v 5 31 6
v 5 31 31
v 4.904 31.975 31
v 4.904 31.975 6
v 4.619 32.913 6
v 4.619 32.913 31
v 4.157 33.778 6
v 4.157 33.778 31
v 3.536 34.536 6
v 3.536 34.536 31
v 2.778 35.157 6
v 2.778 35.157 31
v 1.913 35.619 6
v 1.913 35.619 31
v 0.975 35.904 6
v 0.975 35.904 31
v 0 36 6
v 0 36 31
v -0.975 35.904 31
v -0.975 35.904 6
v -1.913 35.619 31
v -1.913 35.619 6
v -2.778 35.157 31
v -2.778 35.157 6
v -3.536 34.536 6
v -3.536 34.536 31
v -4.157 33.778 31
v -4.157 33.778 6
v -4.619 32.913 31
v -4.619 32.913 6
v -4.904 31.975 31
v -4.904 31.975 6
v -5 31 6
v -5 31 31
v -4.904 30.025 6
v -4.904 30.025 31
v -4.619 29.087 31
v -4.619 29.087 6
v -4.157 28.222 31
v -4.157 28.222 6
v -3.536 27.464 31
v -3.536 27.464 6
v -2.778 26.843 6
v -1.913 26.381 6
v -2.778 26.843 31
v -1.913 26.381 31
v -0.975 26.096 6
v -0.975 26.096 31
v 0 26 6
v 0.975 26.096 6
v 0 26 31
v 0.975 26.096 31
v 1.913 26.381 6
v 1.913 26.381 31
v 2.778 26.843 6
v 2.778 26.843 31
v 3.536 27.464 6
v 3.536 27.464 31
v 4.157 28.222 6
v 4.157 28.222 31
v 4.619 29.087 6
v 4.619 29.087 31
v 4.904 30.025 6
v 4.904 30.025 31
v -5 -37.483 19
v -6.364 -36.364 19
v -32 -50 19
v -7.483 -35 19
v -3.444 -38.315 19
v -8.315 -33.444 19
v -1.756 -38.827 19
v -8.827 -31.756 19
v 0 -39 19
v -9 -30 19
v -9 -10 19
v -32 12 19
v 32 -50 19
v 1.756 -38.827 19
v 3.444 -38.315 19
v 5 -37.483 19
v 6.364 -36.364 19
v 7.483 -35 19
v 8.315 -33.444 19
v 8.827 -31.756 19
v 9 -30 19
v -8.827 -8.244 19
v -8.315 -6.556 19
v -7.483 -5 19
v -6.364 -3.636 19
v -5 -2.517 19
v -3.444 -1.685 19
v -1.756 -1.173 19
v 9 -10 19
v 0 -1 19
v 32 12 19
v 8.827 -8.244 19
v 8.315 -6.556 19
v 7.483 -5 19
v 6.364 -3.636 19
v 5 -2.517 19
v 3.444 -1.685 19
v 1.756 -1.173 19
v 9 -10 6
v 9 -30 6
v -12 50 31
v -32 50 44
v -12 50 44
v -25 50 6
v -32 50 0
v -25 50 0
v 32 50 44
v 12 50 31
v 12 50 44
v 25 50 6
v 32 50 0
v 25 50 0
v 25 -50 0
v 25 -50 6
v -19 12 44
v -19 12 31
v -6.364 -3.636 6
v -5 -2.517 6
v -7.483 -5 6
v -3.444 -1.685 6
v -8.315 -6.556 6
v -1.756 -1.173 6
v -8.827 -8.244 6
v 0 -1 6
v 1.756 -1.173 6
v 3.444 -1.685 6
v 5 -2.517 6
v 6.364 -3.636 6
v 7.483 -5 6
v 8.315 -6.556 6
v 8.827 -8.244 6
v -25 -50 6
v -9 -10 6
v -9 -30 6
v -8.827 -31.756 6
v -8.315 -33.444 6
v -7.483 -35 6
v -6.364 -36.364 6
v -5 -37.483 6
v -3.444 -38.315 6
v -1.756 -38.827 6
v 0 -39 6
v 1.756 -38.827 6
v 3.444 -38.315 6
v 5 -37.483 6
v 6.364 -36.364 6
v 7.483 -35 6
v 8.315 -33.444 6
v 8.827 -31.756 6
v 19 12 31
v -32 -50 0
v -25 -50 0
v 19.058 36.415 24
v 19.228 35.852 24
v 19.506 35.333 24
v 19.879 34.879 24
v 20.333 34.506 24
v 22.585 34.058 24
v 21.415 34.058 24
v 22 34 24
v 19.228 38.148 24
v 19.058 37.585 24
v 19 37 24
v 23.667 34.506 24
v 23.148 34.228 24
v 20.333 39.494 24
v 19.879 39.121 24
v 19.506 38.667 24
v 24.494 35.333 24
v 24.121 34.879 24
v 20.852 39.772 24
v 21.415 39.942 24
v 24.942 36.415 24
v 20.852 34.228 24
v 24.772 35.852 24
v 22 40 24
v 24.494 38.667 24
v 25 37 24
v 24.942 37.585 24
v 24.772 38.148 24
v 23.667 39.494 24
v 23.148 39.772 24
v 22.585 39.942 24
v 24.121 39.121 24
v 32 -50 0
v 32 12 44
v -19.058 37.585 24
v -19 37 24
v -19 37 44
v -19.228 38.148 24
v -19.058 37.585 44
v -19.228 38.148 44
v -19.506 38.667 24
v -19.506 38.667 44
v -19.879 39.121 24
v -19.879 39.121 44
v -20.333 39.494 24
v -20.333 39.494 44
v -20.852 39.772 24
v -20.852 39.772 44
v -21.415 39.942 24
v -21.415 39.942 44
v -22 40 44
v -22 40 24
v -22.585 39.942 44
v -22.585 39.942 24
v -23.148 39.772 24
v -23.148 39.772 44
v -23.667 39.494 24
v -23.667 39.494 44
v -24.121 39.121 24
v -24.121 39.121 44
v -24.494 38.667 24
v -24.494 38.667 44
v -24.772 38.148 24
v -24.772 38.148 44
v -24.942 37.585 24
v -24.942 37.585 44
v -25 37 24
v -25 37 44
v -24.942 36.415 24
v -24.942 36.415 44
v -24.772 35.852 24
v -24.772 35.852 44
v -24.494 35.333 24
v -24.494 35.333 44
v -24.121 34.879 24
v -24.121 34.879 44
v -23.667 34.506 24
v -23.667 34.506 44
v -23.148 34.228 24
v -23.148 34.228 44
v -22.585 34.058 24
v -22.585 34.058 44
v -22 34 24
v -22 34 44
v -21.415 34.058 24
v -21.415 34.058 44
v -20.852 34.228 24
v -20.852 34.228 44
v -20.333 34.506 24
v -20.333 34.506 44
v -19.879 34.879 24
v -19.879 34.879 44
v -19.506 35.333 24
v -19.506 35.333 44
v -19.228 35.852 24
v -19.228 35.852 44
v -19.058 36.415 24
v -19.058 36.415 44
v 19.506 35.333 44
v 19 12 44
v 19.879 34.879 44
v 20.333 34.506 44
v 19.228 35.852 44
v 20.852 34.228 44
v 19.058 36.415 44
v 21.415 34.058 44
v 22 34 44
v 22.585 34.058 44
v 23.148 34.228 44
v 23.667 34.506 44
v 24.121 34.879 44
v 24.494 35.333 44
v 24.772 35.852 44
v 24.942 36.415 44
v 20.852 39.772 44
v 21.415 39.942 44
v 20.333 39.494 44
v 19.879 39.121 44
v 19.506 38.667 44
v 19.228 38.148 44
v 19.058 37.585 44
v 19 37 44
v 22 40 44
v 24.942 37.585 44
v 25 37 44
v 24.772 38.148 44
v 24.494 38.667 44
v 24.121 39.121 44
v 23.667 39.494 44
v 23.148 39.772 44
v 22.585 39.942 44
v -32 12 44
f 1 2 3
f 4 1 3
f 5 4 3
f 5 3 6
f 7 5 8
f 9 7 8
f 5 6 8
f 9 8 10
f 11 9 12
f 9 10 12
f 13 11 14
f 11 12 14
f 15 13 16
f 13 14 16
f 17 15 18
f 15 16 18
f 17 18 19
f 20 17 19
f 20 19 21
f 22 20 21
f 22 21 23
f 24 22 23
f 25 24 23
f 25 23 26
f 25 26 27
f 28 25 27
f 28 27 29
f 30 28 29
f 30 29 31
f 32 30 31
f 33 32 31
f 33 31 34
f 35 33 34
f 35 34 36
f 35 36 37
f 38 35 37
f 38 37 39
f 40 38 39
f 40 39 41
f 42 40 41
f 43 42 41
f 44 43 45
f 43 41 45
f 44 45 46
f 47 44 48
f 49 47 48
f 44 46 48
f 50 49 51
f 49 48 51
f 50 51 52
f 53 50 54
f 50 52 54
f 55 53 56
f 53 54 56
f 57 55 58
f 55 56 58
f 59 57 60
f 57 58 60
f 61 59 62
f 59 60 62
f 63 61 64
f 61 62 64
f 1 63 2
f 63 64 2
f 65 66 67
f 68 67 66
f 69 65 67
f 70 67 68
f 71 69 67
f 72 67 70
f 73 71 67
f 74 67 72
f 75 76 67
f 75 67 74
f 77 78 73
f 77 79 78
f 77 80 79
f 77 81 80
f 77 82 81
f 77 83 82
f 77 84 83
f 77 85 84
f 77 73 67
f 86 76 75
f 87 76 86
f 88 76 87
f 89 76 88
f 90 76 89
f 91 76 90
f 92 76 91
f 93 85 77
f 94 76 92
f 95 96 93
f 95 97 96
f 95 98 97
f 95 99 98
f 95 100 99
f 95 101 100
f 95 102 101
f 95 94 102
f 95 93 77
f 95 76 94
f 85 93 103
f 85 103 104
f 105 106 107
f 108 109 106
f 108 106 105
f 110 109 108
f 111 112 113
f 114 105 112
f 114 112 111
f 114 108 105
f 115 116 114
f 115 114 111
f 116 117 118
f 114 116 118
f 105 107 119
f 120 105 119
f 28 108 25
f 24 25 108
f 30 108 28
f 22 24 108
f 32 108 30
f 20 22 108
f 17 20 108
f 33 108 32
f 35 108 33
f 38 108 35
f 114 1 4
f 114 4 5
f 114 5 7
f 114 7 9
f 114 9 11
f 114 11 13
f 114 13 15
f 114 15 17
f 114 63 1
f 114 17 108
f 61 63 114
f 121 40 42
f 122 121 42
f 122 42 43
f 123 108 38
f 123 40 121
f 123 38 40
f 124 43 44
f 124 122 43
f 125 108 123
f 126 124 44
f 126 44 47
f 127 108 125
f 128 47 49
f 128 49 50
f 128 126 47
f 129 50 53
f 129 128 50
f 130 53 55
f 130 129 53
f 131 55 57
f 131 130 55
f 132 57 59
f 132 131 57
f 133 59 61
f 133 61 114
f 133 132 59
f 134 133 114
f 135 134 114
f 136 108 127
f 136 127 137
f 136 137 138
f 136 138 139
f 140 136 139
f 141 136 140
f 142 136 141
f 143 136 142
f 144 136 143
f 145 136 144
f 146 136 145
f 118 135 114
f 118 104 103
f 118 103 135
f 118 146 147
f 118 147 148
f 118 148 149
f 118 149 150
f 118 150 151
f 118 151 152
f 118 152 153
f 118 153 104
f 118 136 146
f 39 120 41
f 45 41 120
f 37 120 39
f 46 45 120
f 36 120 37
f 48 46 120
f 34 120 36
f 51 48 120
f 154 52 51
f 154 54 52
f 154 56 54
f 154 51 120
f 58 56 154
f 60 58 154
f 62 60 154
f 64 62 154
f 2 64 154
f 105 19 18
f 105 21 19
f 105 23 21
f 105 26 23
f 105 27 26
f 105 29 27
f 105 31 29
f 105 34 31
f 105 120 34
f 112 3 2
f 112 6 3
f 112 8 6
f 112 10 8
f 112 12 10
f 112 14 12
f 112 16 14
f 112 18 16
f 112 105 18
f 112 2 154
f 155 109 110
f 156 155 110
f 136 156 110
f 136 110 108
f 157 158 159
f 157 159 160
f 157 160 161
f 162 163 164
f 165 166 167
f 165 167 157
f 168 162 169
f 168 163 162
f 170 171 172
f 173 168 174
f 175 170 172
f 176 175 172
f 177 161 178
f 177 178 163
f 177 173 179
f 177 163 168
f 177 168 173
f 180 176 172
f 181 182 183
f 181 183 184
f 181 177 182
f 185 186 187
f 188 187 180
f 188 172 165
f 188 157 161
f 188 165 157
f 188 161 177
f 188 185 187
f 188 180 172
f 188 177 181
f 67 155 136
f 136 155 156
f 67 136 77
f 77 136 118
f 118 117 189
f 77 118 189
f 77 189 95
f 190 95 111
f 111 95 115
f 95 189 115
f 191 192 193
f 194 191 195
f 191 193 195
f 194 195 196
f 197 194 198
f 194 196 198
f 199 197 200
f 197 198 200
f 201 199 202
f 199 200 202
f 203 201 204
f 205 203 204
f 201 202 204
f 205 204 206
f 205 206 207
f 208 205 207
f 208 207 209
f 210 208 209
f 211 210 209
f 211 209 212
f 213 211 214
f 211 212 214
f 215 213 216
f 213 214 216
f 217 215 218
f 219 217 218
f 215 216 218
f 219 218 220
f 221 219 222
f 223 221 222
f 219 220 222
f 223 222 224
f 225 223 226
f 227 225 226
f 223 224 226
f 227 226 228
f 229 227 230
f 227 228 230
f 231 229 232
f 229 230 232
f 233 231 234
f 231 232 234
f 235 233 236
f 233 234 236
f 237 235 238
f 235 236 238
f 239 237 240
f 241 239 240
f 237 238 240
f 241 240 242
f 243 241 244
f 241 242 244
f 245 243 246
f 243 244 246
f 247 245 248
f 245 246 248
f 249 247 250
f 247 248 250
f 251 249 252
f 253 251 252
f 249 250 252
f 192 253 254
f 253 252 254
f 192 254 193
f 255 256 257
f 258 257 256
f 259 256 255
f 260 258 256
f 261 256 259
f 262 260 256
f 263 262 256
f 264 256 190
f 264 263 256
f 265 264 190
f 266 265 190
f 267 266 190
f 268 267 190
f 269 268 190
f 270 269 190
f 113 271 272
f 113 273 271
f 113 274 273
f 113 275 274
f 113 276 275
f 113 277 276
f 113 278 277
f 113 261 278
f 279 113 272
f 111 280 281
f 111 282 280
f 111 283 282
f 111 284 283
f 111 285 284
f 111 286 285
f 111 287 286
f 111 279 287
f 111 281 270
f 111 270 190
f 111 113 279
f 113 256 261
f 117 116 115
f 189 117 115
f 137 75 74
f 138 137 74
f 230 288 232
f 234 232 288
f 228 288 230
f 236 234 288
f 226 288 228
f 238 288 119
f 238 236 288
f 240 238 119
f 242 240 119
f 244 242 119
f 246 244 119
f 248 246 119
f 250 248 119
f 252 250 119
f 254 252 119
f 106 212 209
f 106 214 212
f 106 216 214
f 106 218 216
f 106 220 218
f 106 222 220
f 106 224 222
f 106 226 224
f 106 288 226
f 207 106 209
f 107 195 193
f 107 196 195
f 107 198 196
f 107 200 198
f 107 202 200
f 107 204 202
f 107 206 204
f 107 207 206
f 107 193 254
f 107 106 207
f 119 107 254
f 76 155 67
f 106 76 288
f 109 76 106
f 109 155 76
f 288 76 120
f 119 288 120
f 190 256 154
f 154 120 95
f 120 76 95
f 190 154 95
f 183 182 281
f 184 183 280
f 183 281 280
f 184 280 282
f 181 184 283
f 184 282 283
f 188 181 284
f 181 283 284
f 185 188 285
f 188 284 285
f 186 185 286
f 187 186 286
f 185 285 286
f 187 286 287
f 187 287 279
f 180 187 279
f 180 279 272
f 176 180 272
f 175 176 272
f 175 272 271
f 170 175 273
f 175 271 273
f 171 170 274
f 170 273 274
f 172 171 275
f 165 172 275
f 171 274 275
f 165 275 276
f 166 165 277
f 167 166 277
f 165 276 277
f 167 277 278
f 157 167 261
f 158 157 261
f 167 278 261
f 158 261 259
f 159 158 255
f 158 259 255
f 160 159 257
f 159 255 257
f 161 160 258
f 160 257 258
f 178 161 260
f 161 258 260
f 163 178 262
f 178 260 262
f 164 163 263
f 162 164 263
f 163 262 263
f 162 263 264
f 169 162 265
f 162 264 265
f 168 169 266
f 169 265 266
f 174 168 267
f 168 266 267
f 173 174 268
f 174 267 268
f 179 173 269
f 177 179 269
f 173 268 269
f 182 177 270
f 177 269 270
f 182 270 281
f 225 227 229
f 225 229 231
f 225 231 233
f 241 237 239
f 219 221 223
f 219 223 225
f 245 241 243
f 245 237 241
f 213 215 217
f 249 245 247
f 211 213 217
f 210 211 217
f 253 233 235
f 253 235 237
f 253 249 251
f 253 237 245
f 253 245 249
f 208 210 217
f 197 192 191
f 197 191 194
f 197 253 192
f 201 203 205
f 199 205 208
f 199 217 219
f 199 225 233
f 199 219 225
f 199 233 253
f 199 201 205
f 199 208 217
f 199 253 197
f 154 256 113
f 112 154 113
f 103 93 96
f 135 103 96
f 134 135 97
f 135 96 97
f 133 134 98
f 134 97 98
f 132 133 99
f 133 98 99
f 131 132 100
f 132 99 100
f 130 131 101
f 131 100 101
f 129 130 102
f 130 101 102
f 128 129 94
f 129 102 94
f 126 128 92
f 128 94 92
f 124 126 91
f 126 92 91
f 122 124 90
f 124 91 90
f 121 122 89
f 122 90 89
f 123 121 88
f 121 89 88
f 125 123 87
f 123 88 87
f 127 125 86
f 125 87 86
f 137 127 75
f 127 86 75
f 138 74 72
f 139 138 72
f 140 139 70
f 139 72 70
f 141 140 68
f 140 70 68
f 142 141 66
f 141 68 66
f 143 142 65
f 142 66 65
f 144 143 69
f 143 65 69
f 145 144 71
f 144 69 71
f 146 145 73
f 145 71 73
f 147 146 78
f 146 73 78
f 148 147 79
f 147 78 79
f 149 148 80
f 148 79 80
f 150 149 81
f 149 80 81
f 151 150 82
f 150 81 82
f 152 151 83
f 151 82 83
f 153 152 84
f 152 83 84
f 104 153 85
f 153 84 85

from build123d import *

# Parameters (mm, degrees)
SKETCH_W        = 64
SKETCH_H        = 100
PAD_DEPTH       = 19
SKETCH001_W     = 50
SKETCH001_H     = 12.746663
POCKET_DEPTH    = 100.001
SKETCH002_W     = 64
SKETCH002_H     = 38
PAD001_DEPTH    = 25
POCKET001_DEPTH = 13
SKETCH004_R     = 3
SKETCH004_R_2   = 5
POCKET002_DEPTH = 20
SKETCH005_R     = 5
POCKET003_DEPTH = 24.001
POCKET004_DEPTH = 19.001


with BuildPart() as part:
    # Sketch → Pad (new body)
    with BuildSketch(Plane.XY):
        Rectangle(SKETCH_W, SKETCH_H)
    extrude(amount=PAD_DEPTH)

    # Sketch001 → Pocket (cut, through all)
    with BuildSketch(Plane.XZ.offset(50)):
        with Locations((0, -0.373331)):
            Rectangle(SKETCH001_W, SKETCH001_H)
    extrude(amount=-POCKET_DEPTH, mode=Mode.SUBTRACT)

    # Sketch002 → Pad001 (new body)
    with BuildSketch(Plane.XY.offset(19)):
        with Locations((0, 31)):
            Rectangle(SKETCH002_W, SKETCH002_H)
    extrude(amount=PAD001_DEPTH)

    # Sketch003 → Pocket001 (cut)
    with BuildSketch(Plane.XY.offset(44)):
        Polygon((-12, 50), (-19, 12), (19, 12), (12, 50), align=None)
    extrude(amount=-POCKET001_DEPTH, mode=Mode.SUBTRACT)

    # Sketch004 → Pocket002 (cut)
    with BuildSketch(Plane.XY.offset(44)):
        with Locations((-22, 37)):
            Circle(SKETCH004_R)
        with Locations((22, 37)):
            Circle(SKETCH004_R)
        with Locations((0, 31)):
            Circle(SKETCH004_R_2)
    extrude(amount=-POCKET002_DEPTH, mode=Mode.SUBTRACT)

    # Sketch005 → Pocket003 (cut, through all)
    with BuildSketch(Plane.XY.offset(24)):
        with Locations((0, 31)):
            Circle(SKETCH005_R)
    extrude(amount=-POCKET003_DEPTH, mode=Mode.SUBTRACT)

    # Sketch006 → Pocket004 (cut, through all)
    with BuildSketch(Plane.XY.offset(19)):
        with BuildLine():
            ThreePointArc((9, -10), (0, -1), (-9, -10))
            Line((-9, -10), (-9, -30))
            ThreePointArc((-9, -30), (0, -39), (9, -30))
            Line((9, -10), (9, -30))
        make_face()
    extrude(amount=-POCKET004_DEPTH, mode=Mode.SUBTRACT)


solid = part.part
